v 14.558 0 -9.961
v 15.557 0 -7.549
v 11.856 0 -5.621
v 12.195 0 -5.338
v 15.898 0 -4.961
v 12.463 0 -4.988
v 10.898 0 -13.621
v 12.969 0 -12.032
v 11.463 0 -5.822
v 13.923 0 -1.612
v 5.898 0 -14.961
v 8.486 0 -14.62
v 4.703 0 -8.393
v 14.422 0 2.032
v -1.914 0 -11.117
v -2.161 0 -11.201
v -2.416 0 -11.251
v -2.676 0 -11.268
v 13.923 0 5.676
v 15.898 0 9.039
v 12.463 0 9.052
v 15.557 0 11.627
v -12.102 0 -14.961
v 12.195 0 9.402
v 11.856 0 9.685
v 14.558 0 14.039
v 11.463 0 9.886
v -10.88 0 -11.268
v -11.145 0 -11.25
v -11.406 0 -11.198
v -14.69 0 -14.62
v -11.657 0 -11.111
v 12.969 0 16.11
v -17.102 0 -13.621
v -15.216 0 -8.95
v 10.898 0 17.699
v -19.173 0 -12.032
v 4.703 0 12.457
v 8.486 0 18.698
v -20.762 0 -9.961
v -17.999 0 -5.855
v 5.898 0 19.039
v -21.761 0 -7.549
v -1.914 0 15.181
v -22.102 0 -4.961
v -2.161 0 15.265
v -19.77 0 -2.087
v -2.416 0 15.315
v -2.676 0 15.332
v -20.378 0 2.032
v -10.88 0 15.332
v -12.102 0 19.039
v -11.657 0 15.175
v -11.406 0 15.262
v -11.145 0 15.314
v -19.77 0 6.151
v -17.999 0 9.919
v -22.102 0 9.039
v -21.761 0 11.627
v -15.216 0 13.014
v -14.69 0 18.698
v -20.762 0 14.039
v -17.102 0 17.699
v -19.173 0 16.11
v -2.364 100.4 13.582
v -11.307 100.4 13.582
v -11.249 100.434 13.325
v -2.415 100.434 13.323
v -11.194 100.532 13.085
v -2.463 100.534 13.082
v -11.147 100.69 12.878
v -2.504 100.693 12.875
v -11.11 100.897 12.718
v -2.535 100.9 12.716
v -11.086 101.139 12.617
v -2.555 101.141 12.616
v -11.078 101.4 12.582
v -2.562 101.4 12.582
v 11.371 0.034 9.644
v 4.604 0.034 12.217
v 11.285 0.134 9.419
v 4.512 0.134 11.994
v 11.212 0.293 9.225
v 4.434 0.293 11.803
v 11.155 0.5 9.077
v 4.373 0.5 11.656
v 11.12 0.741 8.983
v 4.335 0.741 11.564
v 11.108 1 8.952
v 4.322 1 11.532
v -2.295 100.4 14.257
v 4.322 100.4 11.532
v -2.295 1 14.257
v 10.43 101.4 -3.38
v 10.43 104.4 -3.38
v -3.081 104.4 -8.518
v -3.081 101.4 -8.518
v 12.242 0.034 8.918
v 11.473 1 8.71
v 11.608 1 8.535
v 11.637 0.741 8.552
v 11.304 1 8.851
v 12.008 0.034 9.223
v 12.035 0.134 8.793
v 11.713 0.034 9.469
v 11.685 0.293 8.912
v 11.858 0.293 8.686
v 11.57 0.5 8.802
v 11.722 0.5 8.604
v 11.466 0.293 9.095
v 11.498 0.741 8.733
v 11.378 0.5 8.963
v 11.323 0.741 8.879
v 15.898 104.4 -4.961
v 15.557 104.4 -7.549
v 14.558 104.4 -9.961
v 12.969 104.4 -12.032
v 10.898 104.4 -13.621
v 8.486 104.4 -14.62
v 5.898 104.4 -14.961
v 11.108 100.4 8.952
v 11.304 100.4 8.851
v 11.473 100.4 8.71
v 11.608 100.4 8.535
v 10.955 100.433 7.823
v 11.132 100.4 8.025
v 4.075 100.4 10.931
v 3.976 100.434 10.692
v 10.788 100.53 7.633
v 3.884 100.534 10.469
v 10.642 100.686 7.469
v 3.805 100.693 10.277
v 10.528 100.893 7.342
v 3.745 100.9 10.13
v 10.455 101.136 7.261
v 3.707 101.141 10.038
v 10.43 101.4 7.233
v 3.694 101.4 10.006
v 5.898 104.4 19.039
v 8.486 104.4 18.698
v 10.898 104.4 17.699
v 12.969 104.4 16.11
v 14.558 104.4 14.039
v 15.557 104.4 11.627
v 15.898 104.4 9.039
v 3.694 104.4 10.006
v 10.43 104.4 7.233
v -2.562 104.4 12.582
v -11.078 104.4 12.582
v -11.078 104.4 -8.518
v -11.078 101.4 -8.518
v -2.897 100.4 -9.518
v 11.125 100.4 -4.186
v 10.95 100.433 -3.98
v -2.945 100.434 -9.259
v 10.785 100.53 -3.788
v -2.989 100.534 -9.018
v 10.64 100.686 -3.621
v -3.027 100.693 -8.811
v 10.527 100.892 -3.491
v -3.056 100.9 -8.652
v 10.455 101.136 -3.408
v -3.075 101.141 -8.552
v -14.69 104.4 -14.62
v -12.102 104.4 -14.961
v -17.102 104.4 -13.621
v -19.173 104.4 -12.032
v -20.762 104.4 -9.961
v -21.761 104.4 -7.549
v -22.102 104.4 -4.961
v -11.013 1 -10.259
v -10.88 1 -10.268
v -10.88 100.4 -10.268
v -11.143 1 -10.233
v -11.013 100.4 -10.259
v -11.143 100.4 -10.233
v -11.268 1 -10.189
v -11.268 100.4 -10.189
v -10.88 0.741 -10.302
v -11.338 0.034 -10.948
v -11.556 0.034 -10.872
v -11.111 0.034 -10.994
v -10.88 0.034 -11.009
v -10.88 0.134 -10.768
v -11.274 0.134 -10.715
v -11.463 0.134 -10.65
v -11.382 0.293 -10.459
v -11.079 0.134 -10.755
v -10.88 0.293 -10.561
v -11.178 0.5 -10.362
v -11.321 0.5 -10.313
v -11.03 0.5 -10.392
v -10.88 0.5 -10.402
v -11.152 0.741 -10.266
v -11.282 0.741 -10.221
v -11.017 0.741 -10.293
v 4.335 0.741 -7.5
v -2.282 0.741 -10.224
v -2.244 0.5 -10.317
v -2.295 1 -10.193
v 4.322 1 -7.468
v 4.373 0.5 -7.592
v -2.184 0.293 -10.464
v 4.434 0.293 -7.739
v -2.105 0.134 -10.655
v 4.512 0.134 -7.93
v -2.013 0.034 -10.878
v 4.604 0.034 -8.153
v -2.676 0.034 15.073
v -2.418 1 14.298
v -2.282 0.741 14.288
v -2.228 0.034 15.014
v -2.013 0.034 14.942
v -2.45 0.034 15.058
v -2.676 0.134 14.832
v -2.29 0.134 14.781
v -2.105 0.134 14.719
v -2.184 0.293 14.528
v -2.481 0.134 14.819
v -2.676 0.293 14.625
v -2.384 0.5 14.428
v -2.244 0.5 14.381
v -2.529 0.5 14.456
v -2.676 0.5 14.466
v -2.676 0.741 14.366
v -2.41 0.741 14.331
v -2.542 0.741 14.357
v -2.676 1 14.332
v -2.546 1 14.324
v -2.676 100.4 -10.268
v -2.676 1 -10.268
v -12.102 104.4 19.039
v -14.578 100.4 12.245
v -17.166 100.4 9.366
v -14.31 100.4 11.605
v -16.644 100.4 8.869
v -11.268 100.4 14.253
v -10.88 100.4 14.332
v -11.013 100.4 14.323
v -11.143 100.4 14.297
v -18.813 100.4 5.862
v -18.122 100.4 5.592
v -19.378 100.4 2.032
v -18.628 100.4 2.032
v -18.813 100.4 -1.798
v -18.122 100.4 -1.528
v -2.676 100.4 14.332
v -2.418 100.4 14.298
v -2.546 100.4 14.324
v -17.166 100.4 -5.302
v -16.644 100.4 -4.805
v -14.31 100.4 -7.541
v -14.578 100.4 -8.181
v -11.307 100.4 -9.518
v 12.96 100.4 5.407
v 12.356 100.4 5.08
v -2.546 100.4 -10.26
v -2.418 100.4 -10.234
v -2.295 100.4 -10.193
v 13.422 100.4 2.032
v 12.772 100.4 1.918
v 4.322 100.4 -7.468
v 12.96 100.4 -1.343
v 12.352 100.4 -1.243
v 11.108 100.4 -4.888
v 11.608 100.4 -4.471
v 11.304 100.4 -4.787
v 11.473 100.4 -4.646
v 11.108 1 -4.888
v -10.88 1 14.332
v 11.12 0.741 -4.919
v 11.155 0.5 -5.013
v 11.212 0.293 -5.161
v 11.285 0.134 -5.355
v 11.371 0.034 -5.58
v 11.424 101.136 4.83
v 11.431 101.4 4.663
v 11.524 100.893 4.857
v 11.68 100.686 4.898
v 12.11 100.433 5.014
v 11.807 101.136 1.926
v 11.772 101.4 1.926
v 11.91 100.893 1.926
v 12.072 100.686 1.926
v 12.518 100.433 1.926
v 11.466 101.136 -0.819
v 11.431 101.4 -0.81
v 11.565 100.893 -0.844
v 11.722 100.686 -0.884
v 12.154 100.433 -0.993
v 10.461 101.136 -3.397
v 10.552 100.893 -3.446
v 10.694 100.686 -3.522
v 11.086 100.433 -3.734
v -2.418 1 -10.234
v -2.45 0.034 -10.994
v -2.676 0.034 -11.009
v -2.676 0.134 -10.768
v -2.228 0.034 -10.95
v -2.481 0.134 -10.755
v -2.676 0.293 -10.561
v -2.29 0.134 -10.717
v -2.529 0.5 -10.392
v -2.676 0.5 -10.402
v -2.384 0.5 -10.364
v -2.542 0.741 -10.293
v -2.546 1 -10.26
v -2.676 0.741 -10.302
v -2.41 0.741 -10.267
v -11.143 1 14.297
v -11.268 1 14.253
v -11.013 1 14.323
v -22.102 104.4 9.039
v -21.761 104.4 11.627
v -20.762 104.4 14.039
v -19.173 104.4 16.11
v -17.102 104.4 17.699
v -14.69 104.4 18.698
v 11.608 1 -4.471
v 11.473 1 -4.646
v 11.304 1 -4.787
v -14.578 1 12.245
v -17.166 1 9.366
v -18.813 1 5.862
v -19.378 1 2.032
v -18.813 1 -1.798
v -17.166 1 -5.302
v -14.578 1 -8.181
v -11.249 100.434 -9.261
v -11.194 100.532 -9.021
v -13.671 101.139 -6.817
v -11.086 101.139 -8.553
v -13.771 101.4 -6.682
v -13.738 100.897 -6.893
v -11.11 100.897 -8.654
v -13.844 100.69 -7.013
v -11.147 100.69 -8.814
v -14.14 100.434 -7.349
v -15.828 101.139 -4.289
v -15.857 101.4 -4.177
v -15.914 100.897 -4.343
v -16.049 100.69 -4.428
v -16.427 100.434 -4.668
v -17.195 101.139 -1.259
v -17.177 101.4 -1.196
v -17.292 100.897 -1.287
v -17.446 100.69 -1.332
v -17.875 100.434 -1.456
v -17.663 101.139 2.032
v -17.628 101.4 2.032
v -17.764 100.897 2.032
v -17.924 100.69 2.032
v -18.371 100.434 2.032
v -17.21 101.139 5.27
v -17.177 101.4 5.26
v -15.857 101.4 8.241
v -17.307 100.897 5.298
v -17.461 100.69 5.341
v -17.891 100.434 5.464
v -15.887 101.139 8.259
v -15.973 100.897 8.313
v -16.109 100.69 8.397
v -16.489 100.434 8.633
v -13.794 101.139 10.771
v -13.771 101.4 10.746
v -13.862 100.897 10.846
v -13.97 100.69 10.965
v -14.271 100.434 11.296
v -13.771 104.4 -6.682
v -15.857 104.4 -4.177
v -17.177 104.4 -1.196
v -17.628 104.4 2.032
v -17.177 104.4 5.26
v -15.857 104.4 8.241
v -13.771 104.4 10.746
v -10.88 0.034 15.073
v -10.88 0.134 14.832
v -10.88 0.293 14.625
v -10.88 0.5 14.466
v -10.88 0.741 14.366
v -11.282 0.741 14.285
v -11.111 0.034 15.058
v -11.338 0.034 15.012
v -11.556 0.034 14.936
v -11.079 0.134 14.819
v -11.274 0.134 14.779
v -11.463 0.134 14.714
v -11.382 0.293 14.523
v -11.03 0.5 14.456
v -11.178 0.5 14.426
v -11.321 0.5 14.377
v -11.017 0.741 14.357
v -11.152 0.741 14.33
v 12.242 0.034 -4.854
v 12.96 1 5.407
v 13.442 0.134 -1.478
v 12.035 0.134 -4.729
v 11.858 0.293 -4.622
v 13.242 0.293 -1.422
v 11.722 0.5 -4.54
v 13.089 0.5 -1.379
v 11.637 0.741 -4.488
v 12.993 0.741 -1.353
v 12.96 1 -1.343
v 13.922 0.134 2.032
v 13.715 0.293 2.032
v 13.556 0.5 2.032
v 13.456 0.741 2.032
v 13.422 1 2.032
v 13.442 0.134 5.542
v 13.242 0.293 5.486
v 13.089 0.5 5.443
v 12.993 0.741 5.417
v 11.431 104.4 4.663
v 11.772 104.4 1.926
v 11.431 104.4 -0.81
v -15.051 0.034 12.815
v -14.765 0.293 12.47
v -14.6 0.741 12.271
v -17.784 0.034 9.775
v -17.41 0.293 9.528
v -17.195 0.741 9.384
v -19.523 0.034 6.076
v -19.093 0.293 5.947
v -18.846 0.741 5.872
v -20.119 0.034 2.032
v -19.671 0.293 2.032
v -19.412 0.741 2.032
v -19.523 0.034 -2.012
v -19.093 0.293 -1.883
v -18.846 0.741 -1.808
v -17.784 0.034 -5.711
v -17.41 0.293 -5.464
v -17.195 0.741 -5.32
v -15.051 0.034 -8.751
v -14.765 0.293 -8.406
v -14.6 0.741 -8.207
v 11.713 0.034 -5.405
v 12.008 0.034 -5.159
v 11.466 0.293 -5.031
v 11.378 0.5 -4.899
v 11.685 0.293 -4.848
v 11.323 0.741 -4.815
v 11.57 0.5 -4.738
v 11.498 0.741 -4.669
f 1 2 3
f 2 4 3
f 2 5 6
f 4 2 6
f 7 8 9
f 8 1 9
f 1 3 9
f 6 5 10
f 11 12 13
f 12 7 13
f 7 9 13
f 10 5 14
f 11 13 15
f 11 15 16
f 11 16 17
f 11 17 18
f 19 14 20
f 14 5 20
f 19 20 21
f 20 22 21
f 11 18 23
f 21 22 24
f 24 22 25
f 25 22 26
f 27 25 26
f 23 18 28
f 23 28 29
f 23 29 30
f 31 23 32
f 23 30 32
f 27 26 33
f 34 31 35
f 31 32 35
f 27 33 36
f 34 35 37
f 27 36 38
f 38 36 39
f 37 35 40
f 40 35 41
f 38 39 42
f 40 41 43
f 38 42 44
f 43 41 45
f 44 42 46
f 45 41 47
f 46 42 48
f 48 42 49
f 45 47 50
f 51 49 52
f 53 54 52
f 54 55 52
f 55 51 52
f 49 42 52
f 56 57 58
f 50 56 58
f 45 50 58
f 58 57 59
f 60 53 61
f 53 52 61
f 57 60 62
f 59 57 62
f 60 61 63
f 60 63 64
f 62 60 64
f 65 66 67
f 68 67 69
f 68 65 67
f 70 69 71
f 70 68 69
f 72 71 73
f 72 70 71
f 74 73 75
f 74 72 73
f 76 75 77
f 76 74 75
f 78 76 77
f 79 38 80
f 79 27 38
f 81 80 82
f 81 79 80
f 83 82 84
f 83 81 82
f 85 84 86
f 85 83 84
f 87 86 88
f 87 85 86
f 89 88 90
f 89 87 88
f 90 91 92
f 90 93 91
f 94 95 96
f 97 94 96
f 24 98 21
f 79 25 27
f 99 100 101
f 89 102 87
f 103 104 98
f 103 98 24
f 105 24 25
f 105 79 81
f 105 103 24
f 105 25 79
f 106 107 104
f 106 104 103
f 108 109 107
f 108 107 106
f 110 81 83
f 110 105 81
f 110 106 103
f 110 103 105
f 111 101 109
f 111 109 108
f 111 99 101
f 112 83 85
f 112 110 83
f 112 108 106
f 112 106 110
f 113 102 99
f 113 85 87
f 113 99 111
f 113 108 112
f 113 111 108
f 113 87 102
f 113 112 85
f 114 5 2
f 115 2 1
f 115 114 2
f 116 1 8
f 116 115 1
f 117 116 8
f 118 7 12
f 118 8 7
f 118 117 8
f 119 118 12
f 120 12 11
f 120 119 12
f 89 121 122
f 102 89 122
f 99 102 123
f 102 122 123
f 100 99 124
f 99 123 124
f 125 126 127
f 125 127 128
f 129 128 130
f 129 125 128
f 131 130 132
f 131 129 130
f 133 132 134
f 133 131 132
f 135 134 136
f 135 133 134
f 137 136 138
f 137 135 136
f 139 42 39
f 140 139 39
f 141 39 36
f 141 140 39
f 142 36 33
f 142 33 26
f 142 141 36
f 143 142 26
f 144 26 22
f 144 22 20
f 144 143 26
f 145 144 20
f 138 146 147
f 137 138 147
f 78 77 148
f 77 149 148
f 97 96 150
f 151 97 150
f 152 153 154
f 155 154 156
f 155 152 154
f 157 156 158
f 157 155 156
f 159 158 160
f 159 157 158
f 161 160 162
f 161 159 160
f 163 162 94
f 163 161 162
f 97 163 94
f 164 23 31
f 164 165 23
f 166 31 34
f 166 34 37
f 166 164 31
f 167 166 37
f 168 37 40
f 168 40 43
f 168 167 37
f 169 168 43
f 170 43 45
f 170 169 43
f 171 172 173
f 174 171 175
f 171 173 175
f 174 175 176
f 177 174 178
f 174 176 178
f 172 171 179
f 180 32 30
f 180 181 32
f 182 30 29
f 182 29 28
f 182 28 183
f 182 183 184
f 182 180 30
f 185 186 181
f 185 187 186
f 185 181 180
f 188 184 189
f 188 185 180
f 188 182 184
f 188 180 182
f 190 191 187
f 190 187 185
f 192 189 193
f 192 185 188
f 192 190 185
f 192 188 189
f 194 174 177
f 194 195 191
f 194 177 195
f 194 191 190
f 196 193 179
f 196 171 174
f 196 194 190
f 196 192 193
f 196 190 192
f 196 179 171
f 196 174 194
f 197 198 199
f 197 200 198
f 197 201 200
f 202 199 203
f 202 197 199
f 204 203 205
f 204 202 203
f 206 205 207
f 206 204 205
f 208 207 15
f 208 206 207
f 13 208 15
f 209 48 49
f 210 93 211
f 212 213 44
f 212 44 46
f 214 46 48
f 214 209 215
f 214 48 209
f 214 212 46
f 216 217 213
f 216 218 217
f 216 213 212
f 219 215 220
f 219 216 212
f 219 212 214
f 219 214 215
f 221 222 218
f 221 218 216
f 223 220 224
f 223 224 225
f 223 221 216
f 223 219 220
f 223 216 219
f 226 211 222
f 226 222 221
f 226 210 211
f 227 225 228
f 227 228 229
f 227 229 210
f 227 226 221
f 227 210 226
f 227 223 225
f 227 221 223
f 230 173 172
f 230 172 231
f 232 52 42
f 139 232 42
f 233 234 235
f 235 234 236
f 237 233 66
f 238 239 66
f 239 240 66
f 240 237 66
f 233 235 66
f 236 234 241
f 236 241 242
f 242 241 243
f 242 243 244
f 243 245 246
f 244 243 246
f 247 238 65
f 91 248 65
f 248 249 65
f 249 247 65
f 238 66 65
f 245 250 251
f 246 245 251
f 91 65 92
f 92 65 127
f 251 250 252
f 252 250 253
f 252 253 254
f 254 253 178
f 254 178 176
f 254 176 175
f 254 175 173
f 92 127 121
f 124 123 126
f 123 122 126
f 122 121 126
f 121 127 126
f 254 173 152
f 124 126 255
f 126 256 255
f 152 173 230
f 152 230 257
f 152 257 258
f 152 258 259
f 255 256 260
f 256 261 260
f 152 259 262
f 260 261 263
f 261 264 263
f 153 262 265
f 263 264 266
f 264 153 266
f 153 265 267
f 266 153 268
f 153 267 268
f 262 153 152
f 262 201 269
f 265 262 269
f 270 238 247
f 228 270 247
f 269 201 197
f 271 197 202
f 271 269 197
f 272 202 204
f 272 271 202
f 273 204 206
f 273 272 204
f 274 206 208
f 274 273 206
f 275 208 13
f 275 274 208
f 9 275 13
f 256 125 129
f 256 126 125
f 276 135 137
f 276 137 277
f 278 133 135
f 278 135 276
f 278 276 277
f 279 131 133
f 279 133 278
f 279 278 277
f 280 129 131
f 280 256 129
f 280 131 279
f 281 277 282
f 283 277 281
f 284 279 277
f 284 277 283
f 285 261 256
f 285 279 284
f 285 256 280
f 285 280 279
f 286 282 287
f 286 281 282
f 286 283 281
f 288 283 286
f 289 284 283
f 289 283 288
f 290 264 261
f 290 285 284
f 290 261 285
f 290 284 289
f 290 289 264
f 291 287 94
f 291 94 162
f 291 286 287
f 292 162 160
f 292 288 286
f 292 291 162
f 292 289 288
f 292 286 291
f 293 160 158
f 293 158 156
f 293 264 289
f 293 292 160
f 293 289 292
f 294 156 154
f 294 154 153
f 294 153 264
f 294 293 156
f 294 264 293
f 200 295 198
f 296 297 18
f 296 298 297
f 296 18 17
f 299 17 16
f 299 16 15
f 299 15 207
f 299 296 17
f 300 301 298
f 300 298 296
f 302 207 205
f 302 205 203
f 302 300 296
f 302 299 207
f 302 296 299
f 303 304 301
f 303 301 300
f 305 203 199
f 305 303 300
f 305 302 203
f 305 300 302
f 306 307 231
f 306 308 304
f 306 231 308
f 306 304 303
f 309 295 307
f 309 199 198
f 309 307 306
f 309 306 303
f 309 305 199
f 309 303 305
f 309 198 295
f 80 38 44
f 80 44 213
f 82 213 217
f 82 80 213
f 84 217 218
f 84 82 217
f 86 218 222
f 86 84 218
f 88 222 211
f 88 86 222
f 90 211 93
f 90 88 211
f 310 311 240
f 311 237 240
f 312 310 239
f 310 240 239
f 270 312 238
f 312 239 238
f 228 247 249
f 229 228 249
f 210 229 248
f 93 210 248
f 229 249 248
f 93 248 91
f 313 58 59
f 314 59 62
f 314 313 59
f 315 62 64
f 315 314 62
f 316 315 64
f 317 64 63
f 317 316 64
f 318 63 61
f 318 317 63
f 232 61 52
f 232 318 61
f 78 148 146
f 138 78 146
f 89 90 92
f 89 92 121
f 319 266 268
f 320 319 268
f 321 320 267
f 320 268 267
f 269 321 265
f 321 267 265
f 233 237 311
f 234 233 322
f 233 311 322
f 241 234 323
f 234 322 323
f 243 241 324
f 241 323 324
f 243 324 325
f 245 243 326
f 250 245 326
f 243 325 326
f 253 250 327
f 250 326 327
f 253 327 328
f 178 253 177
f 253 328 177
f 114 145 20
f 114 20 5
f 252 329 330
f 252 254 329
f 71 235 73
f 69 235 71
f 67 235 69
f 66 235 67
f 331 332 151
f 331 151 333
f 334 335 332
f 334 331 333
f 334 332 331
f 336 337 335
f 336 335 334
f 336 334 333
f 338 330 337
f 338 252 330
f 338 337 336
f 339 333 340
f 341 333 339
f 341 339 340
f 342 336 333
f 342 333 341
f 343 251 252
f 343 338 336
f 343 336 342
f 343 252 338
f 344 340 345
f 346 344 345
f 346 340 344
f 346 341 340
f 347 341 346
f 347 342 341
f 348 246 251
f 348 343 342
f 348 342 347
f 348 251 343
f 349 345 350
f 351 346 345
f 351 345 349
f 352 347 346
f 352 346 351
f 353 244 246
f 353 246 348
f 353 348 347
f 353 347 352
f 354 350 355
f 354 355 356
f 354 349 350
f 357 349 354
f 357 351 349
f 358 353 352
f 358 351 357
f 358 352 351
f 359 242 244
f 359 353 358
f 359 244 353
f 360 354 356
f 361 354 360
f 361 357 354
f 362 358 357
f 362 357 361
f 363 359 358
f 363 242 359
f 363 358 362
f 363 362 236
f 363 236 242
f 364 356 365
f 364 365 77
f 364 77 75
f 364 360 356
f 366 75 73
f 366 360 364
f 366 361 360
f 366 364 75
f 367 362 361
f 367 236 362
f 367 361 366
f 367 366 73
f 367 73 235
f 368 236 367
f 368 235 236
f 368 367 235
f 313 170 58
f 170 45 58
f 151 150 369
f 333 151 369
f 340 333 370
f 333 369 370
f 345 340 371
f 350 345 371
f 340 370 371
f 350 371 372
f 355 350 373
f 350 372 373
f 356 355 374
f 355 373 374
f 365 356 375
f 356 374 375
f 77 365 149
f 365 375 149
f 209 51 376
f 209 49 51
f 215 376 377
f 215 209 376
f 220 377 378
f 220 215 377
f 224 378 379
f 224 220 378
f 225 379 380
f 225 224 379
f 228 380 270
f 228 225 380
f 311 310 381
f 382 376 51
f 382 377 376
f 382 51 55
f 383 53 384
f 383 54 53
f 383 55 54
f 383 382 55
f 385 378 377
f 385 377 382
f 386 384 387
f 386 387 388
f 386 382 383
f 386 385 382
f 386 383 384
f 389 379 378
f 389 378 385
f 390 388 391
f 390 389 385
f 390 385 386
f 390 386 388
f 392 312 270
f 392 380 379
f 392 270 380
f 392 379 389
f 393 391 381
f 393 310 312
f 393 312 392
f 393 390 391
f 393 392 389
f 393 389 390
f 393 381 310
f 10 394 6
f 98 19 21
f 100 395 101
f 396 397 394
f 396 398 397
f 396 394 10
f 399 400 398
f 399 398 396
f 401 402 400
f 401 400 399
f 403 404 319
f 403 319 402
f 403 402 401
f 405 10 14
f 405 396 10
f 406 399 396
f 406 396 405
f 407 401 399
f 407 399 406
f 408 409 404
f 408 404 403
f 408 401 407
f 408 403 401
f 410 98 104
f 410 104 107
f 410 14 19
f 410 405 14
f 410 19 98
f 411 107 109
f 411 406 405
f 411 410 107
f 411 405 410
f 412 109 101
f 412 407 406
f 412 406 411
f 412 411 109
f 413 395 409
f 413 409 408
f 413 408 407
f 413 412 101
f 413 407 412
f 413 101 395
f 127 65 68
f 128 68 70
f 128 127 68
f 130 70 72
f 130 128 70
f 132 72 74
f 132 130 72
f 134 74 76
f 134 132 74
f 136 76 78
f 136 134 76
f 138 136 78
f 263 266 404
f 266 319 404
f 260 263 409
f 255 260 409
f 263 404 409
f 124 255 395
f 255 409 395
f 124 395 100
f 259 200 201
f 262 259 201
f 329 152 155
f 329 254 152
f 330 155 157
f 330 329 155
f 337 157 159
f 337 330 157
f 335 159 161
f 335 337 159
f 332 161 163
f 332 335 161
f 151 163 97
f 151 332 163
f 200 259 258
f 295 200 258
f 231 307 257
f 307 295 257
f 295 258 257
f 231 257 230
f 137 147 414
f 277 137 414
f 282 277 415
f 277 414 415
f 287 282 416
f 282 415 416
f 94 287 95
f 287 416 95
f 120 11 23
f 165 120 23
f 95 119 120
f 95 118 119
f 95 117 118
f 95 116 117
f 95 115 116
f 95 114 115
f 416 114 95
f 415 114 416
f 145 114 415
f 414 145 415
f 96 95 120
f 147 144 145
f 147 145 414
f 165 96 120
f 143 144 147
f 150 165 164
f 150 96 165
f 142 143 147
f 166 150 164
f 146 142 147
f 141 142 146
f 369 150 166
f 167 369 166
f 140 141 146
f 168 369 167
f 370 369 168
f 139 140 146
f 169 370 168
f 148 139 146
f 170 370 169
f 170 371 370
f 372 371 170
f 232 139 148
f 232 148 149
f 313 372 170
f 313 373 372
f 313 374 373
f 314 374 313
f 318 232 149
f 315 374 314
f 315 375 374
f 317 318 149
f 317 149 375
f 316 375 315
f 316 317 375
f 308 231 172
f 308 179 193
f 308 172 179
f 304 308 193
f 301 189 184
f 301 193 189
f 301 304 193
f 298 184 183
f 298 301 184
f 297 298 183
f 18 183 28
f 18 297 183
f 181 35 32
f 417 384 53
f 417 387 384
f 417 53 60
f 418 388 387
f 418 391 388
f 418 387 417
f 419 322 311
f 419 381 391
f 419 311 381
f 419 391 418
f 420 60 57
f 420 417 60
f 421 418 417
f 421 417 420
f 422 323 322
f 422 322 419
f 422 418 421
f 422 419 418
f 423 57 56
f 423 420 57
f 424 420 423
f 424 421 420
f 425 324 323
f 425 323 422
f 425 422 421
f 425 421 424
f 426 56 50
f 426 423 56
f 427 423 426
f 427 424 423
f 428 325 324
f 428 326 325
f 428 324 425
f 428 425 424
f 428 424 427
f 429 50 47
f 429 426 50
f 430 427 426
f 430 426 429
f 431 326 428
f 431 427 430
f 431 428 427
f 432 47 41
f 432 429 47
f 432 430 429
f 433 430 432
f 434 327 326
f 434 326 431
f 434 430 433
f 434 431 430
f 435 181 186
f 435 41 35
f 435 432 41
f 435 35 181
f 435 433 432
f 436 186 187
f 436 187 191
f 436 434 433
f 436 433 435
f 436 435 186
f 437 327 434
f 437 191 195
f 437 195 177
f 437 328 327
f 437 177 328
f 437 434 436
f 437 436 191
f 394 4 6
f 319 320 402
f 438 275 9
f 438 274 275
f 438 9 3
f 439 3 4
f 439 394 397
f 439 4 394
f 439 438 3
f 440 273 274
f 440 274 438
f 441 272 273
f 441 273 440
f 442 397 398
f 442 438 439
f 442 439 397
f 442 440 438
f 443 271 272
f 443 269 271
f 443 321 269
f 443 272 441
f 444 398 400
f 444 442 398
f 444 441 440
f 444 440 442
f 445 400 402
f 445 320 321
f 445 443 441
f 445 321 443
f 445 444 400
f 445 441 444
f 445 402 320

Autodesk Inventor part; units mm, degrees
ref_plane "YZ Plane" through (0, 0, 0) normal (1, 0, 0) x (0, 1, 0)
ref_plane "XZ Plane" through (0, 0, 0) normal (0, 1, 0) x (-1, 0, 0)
ref_plane "XY Plane" through (0, 0, 0) normal (0, 0, 1) x (1, 0, 0)
sketch "Sketch1" plane through (0, 0, 0) normal (0, 1, 0) x (-1, 0, 0)
  arc A0 (11.078, -10.268) -> (11.078, 14.332) centre (6.1141, 2.032) ccw
  line L0 (12.8056, -21.6164) -> (10.5439, 25.4442)
  line L1 (11.078, 14.332) -> (2.478, 14.332)
  line L2 (11.078, -10.268) -> (2.478, -10.268)
  line L3 (2.478, 14.332) -> (-4.322, 11.532)
  line L4 (2.478, -10.268) -> (-4.322, -7.468)
  line L5 (-4.322, 11.532) -> (-11.422, 8.832)
  line L6 (-4.322, -7.468) -> (-11.422, -4.768)
  arc A1 (-11.422, 8.832) -> (-11.422, -4.768) centre (-0.862, 2.032) ccw
  line L7 (22.1018, 19.039) -> (-15.8982, 19.039)
  line L8 (-15.8982, 19.039) -> (-15.8982, -14.961)
  line L9 (-15.8982, -14.961) -> (22.1018, -14.961)
  line L10 (22.1018, -14.961) -> (22.1018, 19.039)
  point P0 (0, 0)
  point P1 (11.078, 2.032)
  point P2 (19.378, 2.032)
  point P3 (12.8056, -21.6164)
  point P4 (10.5439, 25.4442)
  point P5 (-13.422, 2.032)
  dimension "d0" = 0
  dimension "d1" = 0
  dimension "d2" = 7.7
  dimension "d3" = 8.6
  dimension "d4" = 8.6
  dimension "d5" = 2.8
  dimension "d6" = 2.8
  dimension "d7" = 6.8
  dimension "d8" = 6.8
  dimension "d9" = 24.6
  dimension "d10" = 7.1
  dimension "d11" = 7.1
  dimension "d12" = 2.7
  dimension "d13" = 2.7
  dimension "d14" = 2
  dimension "d56" = 34
  dimension "d57" = 38
  dimension "d66" = 32.8
  dimension "d67" = 24.6
extrude "Extrusion1" add sketch "Sketch1" along normal blind 104.4 contours A0 L0 L9 L8 L7 L1 L3 L5 A1 L6 L4 L2 | A0 L0 L7 L10 L9
sketch "Sketch3" plane through (0, 104.4, 0) normal (0, 1, 0) x (1, 0, 0)
  line L0 (-11.078, -12.582) -> (-2.5615, -12.582)
  line L1 (-2.5615, -12.582) -> (3.6938, -10.0063)
  line L2 (4.322, -11.532) -> (-2.478, -14.332) projected
  line L3 (3.6938, -10.0063) -> (10.43, -7.2326)
  line L4 (10.43, 3.38) -> (-3.0811, 8.518)
  line L5 (-3.0811, 8.518) -> (-11.078, 8.518)
  arc A0 (-11.078, 8.518) -> (-11.078, -12.582) centre (-5.8566, -2.032) ccw
  arc A1 (10.43, -7.2326) -> (10.43, 3.38) centre (0.611, -1.9263) ccw
  line L6 (-2.478, -14.332) -> (-11.078, -14.332) projected
  line L7 (-11.078, 10.268) -> (-2.478, 10.268) projected
  line L8 (4.322, 7.468) -> (11.422, 4.768) projected
  arc A2 (11.422, -8.832) -> (11.422, 4.768) centre (0.862, -2.032) ccw projected
  arc A3 (-11.078, 10.268) -> (-11.078, -14.332) centre (-6.1141, -2.032) ccw projected
  line L9 (-19.5547, -18.0128) -> (14.794, -18.0128)
  line L10 (14.794, -18.0128) -> (14.794, 13.635)
  line L11 (14.794, 13.635) -> (-19.5547, 13.635)
  line L12 (-19.5547, 13.635) -> (-19.5547, -18.0128)
  point P0 (0, 0)
  point P1 (13.422, -2.032)
  point P2 (11.772, -1.9263)
  point P3 (-17.628, -2.032)
  point P4 (-19.378, -2.032)
  dimension "d31" = 1.75
  dimension "d32" = 1.75
  dimension "d33" = 1.65
  dimension "d34" = 180
  dimension "d35" = 1.65
  dimension "d36" = 1.65
  dimension "d37" = 1.75
  dimension "d38" = 0
extrude "Extrusion2" add sketch "Sketch3" against normal blind 4
fillet "Fillet3" radius 1 22 edges at (-19.378, 0, 2.032) (-6.778, 0, -10.268) (-6.778, 0, 14.332) (0.922, 0, 12.932) (7.872, 0, 10.182) (13.422, 0, 2.032) (7.872, 0, -6.118) (0.922, 0, -8.868) (-17.628, 100.4, 2.032) (-7.0795, 100.4, -8.518) (3.6744, 100.4, -5.949) (11.772, 100.4, 1.9263) (-6.8197, 100.4, 12.582) (3.9342, 100.4, 9.9073) (-11.078, 50.2, 14.332) (-2.478, 50.2, 14.332) (4.322, 50.2, 11.532) (11.422, 50.2, 8.832) (11.422, 50.2, -4.768) (4.322, 50.2, -7.468) (-2.478, 50.2, -10.268) (-11.078, 50.2, -10.268)
fillet "Fillet6" radius 10 4 edges at (-22.1018, 52.2, 19.039) (-22.1018, 52.2, -14.961) (15.8982, 52.2, -14.961) (15.8982, 52.2, 19.039)
sketch "Sketch5" plane through (15.8982, 1, 19.039) normal (1, 0, 0) x (0, 0, -1)
  line L0 (39, 35.2) -> (-4, 35.2)
  line L1 (-4, 35.2) -> (-4, 14.7)
  line L2 (-4, 14.7) -> (39, 14.7)
  line L3 (39, 14.7) -> (39, 35.2)
  line L4 (34, 0) -> (34, 102.4) projected
  line L5 (33, 103.4) -> (1, 103.4) projected
  point P0 (19.039, -1)
  dimension "d58" = 20.5
  dimension "d59" = 5
  dimension "d60" = 43
  dimension "d61" = 88.7
sketch "Sketch7" plane through (-22.1018, 1, -14.961) normal (-1, 0, 0) x (0, 0, 1)
  line L0 (37.3481, 2.34) -> (-4.8767, 2.34)
  line L1 (-4.8767, 2.34) -> (-4.8767, 7.45)
  line L2 (-4.8767, 7.45) -> (37.3481, 7.45)
  line L3 (37.3481, 7.45) -> (37.3481, 2.34)
  line L4 (1, -1) -> (33, -1) projected
  point P0 (14.961, -1)
  dimension "d72" = 3.34
  dimension "d73" = 5.11
sketch "Sketch9" plane through (15.8982, 103.4, -14.961) normal (0, 0, -1) x (-1, 0, 0)
  line L0 (37.5, -100.06) -> (38, -100.06) projected
  line L1 (37.5, -100.06) -> (27.5, -100.06)
  line L2 (27.5, -100.06) -> (27.5, -94.95)
  line L3 (27.5, -94.95) -> (37.5, -94.95)
  line L4 (37.5, -94.95) -> (37.5, -100.06)
  line L5 (37.5, -94.95) -> (38, -94.95) projected
  point P0 (15.8982, -103.4)
  point P1 (37.75, -94.95)
  dimension "d79" = 0
  dimension "d80" = 10
properties part number "PipetteSleeve_3DPrint"
